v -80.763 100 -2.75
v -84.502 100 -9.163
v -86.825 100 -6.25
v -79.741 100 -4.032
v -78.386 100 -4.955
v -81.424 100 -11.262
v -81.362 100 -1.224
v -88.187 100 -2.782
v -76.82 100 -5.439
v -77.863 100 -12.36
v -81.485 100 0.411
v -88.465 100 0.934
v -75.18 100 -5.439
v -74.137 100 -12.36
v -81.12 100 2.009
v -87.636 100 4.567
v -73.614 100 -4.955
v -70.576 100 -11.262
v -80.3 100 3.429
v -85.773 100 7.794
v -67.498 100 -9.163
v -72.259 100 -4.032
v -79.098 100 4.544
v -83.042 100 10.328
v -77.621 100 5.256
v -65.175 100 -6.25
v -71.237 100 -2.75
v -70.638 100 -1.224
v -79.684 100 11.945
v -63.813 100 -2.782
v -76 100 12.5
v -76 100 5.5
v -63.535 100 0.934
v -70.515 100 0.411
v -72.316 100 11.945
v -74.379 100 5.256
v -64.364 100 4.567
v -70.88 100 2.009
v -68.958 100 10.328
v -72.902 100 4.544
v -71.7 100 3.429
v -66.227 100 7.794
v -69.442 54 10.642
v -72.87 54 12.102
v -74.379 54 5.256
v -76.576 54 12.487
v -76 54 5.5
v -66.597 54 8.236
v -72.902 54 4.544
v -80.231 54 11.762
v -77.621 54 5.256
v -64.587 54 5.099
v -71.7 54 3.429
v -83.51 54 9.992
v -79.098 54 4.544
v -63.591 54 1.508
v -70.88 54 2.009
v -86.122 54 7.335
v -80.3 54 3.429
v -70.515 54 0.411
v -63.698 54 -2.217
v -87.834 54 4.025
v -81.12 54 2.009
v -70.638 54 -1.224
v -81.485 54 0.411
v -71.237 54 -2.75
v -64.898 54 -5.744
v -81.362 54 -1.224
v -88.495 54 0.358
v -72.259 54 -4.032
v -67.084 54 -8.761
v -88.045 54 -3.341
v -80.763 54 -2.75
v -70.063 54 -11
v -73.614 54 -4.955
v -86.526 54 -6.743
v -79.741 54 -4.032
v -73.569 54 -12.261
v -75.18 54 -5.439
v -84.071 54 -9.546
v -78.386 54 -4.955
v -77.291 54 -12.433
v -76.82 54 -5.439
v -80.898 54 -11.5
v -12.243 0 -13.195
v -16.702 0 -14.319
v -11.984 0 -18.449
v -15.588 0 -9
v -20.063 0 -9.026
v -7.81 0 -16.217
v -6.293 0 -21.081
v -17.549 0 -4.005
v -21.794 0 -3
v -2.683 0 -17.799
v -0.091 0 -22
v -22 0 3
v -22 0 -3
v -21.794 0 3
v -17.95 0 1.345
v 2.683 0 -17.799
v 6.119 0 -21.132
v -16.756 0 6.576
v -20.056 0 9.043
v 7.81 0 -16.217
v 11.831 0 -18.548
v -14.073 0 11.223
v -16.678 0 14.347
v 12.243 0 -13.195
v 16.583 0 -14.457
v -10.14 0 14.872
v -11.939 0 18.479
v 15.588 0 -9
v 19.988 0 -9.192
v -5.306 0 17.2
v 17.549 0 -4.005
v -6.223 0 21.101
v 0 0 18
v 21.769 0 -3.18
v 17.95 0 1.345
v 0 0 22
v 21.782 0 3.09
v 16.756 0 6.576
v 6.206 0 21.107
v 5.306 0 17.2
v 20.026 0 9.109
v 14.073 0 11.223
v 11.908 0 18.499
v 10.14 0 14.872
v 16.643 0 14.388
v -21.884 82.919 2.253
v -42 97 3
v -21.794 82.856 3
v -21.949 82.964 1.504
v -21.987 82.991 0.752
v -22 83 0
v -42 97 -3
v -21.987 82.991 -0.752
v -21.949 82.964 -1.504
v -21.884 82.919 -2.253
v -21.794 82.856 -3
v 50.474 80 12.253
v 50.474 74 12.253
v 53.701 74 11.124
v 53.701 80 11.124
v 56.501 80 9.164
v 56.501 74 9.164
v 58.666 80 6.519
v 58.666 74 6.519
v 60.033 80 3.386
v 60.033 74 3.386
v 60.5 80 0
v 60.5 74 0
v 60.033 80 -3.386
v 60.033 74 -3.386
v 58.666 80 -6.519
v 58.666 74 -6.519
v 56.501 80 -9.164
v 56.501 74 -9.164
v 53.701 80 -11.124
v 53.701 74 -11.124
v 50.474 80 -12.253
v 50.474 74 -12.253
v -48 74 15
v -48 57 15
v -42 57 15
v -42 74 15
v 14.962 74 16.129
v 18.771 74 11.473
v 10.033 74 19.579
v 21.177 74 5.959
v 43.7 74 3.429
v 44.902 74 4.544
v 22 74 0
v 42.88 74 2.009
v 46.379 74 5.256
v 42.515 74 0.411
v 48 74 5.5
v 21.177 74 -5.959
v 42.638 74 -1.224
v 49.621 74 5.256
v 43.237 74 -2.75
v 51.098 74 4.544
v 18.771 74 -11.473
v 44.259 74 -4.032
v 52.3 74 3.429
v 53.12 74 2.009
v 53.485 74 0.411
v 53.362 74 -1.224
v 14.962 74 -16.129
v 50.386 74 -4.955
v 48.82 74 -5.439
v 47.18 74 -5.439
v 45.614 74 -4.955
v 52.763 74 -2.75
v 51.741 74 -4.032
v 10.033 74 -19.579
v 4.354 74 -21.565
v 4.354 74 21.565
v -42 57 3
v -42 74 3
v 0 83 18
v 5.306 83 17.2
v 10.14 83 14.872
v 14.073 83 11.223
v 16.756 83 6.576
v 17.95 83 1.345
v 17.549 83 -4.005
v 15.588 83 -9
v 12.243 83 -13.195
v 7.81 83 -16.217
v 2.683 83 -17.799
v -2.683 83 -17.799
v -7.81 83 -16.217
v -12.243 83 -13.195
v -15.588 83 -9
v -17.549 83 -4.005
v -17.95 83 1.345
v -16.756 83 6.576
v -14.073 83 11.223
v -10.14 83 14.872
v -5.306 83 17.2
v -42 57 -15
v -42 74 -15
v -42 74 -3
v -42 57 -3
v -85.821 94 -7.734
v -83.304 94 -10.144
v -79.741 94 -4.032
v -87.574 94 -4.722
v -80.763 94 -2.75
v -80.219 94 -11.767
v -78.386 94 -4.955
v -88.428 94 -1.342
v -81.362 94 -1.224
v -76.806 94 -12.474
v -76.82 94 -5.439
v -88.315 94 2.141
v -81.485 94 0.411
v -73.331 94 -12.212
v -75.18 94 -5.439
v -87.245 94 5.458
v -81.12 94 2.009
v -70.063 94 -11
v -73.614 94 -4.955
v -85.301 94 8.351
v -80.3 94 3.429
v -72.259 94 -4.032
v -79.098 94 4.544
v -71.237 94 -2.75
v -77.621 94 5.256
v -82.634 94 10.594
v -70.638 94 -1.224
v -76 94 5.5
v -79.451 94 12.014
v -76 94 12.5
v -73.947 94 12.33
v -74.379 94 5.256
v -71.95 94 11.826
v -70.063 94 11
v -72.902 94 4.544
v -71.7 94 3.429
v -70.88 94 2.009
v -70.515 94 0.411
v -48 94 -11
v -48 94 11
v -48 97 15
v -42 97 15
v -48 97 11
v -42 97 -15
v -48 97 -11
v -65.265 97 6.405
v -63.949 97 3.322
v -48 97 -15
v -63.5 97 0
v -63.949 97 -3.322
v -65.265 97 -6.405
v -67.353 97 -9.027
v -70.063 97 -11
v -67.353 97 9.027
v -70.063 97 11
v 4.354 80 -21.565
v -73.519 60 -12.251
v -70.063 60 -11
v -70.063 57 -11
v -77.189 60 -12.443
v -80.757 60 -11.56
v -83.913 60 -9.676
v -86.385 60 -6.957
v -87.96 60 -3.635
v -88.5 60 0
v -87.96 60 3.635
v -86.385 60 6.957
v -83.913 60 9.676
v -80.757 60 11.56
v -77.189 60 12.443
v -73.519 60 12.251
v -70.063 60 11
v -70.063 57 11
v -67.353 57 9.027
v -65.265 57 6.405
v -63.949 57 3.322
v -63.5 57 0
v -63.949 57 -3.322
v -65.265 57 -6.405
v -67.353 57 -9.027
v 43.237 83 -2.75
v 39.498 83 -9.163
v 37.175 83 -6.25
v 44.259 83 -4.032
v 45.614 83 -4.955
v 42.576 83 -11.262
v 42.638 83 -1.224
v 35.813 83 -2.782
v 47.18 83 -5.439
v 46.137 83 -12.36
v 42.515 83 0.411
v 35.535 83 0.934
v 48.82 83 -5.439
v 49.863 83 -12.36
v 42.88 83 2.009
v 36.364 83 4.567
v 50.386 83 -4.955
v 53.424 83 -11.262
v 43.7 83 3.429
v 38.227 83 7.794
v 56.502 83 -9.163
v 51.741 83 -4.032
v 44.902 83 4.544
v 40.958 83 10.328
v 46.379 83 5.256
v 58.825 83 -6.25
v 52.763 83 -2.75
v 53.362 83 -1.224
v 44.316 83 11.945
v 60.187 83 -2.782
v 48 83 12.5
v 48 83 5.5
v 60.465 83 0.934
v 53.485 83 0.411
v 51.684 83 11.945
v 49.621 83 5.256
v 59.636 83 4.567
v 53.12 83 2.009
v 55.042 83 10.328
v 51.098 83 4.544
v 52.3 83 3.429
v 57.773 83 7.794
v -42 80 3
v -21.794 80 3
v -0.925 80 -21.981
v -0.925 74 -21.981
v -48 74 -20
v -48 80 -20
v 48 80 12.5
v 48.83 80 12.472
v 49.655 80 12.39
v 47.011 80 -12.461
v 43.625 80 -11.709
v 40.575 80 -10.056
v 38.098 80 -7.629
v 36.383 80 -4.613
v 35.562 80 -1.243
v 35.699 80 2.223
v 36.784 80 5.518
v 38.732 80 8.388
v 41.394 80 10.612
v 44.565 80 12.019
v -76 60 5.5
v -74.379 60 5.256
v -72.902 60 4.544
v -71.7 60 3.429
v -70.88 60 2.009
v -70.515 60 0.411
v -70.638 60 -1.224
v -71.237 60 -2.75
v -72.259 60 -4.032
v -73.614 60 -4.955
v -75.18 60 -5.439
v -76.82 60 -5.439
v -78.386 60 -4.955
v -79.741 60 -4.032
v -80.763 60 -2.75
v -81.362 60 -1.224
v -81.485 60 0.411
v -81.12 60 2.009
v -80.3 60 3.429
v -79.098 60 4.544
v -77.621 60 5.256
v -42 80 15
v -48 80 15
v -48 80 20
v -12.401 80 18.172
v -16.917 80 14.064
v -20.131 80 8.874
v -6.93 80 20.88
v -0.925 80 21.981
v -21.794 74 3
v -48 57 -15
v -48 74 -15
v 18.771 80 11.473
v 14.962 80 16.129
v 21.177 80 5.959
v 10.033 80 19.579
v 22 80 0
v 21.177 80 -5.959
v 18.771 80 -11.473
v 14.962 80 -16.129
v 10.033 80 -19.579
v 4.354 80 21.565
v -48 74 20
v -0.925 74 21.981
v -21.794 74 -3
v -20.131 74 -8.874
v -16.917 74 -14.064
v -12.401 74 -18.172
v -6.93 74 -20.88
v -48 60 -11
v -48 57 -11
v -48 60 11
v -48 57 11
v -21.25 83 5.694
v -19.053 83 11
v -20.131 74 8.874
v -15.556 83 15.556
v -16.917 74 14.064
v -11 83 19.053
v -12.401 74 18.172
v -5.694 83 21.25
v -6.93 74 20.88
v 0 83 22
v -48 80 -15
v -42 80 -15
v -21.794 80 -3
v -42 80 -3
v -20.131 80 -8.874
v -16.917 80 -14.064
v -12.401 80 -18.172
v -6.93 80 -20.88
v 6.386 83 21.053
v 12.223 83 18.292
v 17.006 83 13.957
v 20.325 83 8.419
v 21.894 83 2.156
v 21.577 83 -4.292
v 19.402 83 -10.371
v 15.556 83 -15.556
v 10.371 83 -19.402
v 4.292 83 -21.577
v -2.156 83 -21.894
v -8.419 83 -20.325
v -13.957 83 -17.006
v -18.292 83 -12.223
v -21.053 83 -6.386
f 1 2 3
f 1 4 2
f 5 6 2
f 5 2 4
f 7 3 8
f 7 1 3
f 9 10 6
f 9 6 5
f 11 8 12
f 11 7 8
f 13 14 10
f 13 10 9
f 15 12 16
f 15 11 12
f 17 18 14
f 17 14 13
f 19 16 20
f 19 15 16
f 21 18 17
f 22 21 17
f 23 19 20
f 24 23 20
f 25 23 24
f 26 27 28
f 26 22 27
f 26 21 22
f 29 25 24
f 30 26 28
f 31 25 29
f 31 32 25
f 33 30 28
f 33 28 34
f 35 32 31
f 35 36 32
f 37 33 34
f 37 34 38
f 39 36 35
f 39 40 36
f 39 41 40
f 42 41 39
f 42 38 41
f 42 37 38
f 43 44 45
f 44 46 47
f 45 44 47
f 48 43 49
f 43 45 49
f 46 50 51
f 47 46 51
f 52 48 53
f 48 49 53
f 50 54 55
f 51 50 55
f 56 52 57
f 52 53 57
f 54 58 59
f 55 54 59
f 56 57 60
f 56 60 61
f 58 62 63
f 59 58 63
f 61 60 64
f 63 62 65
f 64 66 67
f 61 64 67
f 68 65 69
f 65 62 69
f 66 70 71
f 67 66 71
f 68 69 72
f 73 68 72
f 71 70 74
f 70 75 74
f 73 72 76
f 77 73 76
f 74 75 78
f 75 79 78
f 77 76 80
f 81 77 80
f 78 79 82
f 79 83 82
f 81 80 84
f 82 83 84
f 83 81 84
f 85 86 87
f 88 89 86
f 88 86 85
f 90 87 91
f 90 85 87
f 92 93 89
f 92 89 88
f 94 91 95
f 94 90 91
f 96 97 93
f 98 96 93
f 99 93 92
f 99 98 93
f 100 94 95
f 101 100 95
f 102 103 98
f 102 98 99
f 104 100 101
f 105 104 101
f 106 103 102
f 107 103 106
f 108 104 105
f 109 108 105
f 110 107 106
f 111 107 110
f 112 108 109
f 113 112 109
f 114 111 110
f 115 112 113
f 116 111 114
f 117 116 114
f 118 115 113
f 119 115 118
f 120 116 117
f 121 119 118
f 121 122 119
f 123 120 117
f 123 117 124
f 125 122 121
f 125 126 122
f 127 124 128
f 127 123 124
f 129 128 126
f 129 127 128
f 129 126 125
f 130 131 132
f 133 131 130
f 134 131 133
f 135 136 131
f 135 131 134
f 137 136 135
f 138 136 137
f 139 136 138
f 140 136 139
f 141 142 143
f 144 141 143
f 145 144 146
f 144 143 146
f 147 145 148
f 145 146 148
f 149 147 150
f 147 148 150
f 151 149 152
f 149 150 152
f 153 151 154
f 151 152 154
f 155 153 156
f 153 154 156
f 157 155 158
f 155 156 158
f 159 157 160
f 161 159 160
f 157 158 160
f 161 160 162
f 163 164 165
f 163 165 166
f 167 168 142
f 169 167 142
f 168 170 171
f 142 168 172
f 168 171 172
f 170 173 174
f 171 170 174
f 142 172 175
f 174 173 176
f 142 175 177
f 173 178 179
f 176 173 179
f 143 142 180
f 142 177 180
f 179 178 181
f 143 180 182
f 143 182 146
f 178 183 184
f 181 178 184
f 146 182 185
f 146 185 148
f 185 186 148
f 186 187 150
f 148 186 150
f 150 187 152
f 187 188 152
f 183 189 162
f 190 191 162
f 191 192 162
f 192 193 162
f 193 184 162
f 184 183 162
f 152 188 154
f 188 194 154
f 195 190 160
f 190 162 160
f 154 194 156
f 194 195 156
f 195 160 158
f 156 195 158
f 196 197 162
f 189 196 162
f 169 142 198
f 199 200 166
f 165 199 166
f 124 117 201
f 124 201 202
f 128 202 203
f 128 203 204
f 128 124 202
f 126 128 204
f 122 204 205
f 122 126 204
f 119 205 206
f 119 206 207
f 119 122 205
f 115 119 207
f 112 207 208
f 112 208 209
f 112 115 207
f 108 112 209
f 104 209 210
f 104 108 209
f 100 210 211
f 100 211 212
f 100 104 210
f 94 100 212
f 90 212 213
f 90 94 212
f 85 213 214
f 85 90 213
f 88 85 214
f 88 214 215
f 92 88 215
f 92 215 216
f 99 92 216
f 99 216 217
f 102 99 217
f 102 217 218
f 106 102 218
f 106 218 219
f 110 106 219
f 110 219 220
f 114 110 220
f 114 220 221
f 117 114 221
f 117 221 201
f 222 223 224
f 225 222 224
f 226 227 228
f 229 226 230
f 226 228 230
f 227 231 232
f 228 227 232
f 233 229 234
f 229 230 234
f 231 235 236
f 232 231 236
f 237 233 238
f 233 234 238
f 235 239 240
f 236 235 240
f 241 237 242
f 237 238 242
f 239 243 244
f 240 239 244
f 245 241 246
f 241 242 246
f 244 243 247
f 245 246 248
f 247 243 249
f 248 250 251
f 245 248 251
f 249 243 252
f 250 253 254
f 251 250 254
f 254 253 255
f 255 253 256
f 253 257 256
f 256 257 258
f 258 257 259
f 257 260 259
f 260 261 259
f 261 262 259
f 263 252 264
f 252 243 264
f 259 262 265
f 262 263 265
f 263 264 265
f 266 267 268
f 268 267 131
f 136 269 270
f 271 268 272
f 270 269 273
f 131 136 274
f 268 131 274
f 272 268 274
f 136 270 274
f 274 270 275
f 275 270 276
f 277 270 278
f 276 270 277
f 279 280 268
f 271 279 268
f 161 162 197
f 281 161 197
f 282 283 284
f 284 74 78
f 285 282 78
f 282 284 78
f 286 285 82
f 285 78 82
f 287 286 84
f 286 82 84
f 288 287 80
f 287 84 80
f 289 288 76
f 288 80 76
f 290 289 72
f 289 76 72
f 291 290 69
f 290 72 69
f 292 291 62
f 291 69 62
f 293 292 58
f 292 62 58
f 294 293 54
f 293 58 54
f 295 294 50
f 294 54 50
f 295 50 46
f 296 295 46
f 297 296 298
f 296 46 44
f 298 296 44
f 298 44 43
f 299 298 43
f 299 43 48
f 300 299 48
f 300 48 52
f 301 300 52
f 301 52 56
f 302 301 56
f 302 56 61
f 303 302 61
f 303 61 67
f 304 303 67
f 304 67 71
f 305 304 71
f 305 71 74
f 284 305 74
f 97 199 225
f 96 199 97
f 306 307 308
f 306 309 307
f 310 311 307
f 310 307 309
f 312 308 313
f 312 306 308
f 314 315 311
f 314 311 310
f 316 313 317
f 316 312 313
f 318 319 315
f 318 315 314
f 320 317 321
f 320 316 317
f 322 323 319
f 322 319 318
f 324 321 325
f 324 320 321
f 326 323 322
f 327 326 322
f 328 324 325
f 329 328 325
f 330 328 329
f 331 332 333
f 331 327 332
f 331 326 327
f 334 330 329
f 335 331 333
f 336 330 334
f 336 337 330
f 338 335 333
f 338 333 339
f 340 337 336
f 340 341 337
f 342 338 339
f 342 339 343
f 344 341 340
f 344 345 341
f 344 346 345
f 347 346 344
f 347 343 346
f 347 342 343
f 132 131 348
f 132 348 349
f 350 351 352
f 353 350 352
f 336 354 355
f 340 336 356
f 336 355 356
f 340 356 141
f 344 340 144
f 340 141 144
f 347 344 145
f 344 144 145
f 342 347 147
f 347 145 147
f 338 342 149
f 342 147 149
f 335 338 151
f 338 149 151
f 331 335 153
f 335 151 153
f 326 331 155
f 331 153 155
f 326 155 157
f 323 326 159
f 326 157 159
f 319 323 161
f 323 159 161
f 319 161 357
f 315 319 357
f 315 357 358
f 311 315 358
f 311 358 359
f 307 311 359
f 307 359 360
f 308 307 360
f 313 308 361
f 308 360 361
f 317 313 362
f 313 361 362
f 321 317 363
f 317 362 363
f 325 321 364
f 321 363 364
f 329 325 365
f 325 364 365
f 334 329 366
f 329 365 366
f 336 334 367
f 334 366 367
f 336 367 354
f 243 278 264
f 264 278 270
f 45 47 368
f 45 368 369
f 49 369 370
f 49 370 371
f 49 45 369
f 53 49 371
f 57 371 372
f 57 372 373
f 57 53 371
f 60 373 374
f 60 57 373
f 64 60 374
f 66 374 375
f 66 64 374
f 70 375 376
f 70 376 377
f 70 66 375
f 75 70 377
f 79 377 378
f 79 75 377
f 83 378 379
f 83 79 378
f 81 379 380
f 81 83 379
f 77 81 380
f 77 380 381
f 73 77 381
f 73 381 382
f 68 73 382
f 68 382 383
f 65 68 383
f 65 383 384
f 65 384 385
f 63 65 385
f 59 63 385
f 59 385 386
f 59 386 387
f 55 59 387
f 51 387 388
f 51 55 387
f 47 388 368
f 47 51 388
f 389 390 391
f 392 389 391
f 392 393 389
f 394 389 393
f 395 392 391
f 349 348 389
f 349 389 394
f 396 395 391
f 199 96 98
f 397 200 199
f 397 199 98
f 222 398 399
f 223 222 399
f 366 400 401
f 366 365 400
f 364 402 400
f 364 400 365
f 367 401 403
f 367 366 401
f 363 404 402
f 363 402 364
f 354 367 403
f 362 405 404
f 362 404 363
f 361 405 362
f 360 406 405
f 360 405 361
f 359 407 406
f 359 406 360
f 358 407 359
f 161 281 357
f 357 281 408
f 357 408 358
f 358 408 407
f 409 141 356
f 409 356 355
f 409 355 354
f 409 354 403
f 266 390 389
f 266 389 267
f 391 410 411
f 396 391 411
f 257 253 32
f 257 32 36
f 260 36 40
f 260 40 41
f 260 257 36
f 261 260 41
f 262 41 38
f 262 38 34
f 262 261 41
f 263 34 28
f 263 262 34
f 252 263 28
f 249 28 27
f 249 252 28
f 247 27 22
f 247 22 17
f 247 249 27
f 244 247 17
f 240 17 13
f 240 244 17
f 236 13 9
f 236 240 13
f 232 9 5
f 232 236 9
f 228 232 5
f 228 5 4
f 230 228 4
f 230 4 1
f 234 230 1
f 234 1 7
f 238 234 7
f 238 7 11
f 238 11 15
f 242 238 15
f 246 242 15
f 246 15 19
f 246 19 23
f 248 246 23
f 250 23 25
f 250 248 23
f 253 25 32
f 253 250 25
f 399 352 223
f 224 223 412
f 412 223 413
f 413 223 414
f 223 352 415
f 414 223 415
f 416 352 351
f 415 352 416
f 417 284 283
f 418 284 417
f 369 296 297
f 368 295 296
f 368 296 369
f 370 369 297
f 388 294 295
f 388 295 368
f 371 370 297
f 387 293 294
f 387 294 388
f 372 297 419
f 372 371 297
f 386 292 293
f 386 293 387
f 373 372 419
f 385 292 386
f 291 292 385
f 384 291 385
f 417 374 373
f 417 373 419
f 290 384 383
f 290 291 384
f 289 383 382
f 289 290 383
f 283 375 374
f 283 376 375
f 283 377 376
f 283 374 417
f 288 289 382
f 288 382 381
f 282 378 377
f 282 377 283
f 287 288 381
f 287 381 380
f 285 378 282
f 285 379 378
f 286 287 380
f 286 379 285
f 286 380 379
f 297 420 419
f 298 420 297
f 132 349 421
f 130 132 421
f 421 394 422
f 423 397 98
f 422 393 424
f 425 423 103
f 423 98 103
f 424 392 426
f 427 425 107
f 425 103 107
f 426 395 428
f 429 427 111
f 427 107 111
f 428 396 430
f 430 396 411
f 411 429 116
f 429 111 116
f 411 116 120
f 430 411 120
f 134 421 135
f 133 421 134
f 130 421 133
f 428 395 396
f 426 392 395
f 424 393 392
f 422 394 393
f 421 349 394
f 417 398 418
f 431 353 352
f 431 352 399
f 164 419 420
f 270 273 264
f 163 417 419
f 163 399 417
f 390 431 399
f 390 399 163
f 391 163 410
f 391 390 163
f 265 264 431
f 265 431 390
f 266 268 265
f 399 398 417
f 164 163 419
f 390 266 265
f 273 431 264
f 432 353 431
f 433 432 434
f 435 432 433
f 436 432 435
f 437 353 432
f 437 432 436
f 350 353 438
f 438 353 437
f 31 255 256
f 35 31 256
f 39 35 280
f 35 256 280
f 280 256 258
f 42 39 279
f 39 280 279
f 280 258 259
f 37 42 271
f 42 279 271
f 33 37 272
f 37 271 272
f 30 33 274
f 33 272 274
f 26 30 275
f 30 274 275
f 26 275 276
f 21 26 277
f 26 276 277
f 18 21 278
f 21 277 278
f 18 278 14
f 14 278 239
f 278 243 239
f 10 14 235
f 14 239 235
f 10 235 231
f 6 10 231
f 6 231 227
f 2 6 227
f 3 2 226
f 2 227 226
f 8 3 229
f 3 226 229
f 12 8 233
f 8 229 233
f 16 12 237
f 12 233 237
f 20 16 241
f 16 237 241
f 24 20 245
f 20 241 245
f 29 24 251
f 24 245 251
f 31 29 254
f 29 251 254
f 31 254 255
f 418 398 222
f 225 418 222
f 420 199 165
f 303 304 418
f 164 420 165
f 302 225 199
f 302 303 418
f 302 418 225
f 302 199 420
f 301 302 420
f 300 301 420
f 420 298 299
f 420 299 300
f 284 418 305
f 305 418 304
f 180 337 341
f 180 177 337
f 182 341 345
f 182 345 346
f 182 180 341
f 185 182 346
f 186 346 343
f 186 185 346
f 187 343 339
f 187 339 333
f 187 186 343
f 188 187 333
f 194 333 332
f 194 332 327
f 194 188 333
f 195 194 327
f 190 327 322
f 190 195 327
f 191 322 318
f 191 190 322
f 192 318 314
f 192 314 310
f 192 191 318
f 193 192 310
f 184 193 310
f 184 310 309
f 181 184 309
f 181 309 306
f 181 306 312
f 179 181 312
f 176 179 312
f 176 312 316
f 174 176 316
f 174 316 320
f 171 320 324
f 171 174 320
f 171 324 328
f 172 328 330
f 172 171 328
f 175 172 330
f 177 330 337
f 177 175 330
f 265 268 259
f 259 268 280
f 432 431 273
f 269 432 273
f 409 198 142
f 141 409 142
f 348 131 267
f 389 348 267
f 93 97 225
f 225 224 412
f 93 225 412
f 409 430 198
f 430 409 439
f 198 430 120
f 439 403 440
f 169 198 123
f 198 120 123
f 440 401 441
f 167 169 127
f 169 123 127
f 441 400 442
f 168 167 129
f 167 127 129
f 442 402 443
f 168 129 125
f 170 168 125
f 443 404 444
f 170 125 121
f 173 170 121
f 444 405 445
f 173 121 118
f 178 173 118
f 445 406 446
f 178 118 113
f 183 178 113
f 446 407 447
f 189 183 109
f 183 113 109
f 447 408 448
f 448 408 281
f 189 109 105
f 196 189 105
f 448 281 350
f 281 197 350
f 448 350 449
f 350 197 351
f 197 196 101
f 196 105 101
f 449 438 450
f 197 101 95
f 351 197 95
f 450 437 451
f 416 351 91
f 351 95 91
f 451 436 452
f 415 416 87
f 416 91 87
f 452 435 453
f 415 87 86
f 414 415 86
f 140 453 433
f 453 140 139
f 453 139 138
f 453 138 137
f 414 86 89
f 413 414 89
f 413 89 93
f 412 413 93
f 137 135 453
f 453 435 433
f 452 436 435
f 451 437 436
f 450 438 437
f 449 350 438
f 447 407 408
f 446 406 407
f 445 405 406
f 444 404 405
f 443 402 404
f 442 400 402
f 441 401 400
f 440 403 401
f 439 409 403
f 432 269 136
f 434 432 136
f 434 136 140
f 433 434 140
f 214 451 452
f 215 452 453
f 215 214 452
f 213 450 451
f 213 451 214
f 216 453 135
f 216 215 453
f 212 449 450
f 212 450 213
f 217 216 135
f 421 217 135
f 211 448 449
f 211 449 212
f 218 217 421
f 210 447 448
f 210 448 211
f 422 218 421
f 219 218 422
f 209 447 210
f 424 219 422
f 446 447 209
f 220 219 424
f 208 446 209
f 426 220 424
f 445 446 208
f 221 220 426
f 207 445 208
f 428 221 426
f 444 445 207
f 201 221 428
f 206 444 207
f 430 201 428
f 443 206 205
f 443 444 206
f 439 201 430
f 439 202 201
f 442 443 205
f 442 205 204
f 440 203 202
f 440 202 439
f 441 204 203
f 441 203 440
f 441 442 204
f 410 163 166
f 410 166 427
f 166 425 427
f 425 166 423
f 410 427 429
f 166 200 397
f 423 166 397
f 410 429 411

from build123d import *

# Parameters (mm, degrees)
SKETCH1_R            = 22
SKETCH1_R_2          = 18
BOSS_EXTRUDE1_DEPTH  = 83
BOSS_EXTRUDE2_START  = -9
SKETCH2_R            = 18
SKETCH2_R_2          = 5.5
BOSS_EXTRUDE2_DEPTH  = 6
SKETCH6_W            = 30
SKETCH6_H            = 40
BOSS_EXTRUDE5_DEPTH  = 6
BOSS_EXTRUDE6_START  = -3
SKETCH7_R            = 12.5
SKETCH7_R_2          = 5.5
BOSS_EXTRUDE6_DEPTH  = 6
BOSS_EXTRUDE7_DEPTH  = 3
BOSS_EXTRUDE8_START  = -6
SKETCH9_R            = 12.5
SKETCH9_R_2          = 5.5
BOSS_EXTRUDE8_DEPTH  = 6
RIB1_REACH           = 137.338
SKETCH10_WALL_W      = 297.088193202
SKETCH10_WALL_H      = 6
BOSS_EXTRUDE10_DEPTH = 3
SKETCH12_R           = 12.5
SKETCH12_R_2         = 5.5
BOSS_EXTRUDE11_DEPTH = 3


with BuildPart() as part:
    # Sketch1 → Boss-Extrude1 (new body)
    with BuildSketch(Plane(origin=(0, 0, 0), x_dir=(1, 0, 0), z_dir=(0, 1, 0))):
        Circle(SKETCH1_R)
        Circle(SKETCH1_R_2, mode=Mode.SUBTRACT)
    extrude(amount=BOSS_EXTRUDE1_DEPTH)

    # Sketch2 → Boss-Extrude2 (add)
    with BuildSketch(Plane(origin=(0, 83, 0), x_dir=(1, 0, 0), z_dir=(0, 1, 0)).offset(BOSS_EXTRUDE2_START)):
        with BuildLine():
            Line((-48, 20), (-48, -20))
            Line((-48, -20), (-0.924768705, -21.980555108))
            ThreePointArc((-0.924768705, -21.980555108), (1.727252911, -21.932090584), (4.354166667, -21.564814691))
            Line((4.354166667, -21.564814691), (50.473958333, -12.25273562))
            ThreePointArc((50.473958333, -12.25273562), (60.5, 0), (50.473958333, 12.25273562))
            Line((50.473958333, 12.25273562), (4.354166667, 21.564814691))
            ThreePointArc((4.354166667, 21.564814691), (1.727252911, 21.932090584), (-0.924768705, 21.980555108))
            Line((-0.924768705, 21.980555108), (-48, 20))
        make_face()
        Circle(SKETCH2_R, mode=Mode.SUBTRACT)
        with Locations((48, 0)):
            Circle(SKETCH2_R_2, mode=Mode.SUBTRACT)
    extrude(amount=BOSS_EXTRUDE2_DEPTH)

    # Sketch6 → Boss-Extrude5 (add)
    with BuildSketch(Plane.ZY.offset(48)):
        with Locations((0, 77)):
            Rectangle(SKETCH6_W, SKETCH6_H)
    extrude(amount=-BOSS_EXTRUDE5_DEPTH)



with BuildPart() as body_2:
    # Sketch7 → Boss-Extrude6 (new body)
    with BuildSketch(Plane(origin=(0, 97, 0), x_dir=(1, 0, 0), z_dir=(0, 1, 0)).offset(BOSS_EXTRUDE6_START)):
        with Locations((-76, 0)):
            Circle(SKETCH7_R)
        with Locations((-76, 0)):
            Circle(SKETCH7_R_2, mode=Mode.SUBTRACT)
    extrude(amount=BOSS_EXTRUDE6_DEPTH)


with BuildPart() as part_1:
    add(part.part)

    add(body_2.part)  # Boss-Extrude7 merges body 2
    # Sketch8 → Boss-Extrude7 (add)
    with BuildSketch(Plane(origin=(0, 97, 0), x_dir=(1, 0, 0), z_dir=(0, 1, 0))):
        with BuildLine():
            Line((-70.062828956, 11), (-48, 11))
            Line((-48, 11), (-48, -11))
            Line((-48, -11), (-70.062828956, -11))
            ThreePointArc((-70.062828956, -11), (-63.5, 0), (-70.062828956, 11))
        make_face()
    boss_extrude7 = extrude(amount=-BOSS_EXTRUDE7_DEPTH)

    # Mirror3: Boss-Extrude7 across plane
    add(boss_extrude7.mirror(Plane.ZX.offset(77)))

    # Sketch9 → Boss-Extrude8 (add)
    with BuildSketch(Plane(origin=(0, 60, 0), x_dir=(1, 0, 0), z_dir=(0, 1, 0)).offset(BOSS_EXTRUDE8_START)):
        with Locations((-76, 0)):
            Circle(SKETCH9_R)
        with Locations((-76, 0)):
            Circle(SKETCH9_R_2, mode=Mode.SUBTRACT)
    extrude(amount=BOSS_EXTRUDE8_DEPTH)

    # Sketch10 wall → Rib1 (add, up to next)
    with BuildSketch(Plane(origin=(-32, 90, 0), x_dir=(0.819231920519, -0.573462344363, 0), z_dir=(0.573462344363, 0.819231920519, 0)), mode=Mode.PRIVATE) as rib1_sk1:
        Rectangle(SKETCH10_WALL_W, SKETCH10_WALL_H)
    rib1_tool1 = extrude(rib1_sk1.sketch, amount=-RIB1_REACH, mode=Mode.PRIVATE) - part_1.part
    add(rib1_tool1.solids().sort_by_distance((-32, 90, 0))[0])

    # Sketch11 → Boss-Extrude10 (add, symmetric)
    with BuildSketch(Plane.XY):
        Polygon((-42, 57), (-22, 0), (-20, 0), (-20, 74), (-42, 74), align=None)
    extrude(amount=BOSS_EXTRUDE10_DEPTH, both=True)

    # Sketch12 → Boss-Extrude11 (add)
    with BuildSketch(Plane(origin=(0, 80, 0), x_dir=(1, 0, 0), z_dir=(0, 1, 0))):
        with Locations((48, 0)):
            Circle(SKETCH12_R)
        with Locations((48, 0)):
            Circle(SKETCH12_R_2, mode=Mode.SUBTRACT)
    extrude(amount=BOSS_EXTRUDE11_DEPTH)


solid = part_1.part
